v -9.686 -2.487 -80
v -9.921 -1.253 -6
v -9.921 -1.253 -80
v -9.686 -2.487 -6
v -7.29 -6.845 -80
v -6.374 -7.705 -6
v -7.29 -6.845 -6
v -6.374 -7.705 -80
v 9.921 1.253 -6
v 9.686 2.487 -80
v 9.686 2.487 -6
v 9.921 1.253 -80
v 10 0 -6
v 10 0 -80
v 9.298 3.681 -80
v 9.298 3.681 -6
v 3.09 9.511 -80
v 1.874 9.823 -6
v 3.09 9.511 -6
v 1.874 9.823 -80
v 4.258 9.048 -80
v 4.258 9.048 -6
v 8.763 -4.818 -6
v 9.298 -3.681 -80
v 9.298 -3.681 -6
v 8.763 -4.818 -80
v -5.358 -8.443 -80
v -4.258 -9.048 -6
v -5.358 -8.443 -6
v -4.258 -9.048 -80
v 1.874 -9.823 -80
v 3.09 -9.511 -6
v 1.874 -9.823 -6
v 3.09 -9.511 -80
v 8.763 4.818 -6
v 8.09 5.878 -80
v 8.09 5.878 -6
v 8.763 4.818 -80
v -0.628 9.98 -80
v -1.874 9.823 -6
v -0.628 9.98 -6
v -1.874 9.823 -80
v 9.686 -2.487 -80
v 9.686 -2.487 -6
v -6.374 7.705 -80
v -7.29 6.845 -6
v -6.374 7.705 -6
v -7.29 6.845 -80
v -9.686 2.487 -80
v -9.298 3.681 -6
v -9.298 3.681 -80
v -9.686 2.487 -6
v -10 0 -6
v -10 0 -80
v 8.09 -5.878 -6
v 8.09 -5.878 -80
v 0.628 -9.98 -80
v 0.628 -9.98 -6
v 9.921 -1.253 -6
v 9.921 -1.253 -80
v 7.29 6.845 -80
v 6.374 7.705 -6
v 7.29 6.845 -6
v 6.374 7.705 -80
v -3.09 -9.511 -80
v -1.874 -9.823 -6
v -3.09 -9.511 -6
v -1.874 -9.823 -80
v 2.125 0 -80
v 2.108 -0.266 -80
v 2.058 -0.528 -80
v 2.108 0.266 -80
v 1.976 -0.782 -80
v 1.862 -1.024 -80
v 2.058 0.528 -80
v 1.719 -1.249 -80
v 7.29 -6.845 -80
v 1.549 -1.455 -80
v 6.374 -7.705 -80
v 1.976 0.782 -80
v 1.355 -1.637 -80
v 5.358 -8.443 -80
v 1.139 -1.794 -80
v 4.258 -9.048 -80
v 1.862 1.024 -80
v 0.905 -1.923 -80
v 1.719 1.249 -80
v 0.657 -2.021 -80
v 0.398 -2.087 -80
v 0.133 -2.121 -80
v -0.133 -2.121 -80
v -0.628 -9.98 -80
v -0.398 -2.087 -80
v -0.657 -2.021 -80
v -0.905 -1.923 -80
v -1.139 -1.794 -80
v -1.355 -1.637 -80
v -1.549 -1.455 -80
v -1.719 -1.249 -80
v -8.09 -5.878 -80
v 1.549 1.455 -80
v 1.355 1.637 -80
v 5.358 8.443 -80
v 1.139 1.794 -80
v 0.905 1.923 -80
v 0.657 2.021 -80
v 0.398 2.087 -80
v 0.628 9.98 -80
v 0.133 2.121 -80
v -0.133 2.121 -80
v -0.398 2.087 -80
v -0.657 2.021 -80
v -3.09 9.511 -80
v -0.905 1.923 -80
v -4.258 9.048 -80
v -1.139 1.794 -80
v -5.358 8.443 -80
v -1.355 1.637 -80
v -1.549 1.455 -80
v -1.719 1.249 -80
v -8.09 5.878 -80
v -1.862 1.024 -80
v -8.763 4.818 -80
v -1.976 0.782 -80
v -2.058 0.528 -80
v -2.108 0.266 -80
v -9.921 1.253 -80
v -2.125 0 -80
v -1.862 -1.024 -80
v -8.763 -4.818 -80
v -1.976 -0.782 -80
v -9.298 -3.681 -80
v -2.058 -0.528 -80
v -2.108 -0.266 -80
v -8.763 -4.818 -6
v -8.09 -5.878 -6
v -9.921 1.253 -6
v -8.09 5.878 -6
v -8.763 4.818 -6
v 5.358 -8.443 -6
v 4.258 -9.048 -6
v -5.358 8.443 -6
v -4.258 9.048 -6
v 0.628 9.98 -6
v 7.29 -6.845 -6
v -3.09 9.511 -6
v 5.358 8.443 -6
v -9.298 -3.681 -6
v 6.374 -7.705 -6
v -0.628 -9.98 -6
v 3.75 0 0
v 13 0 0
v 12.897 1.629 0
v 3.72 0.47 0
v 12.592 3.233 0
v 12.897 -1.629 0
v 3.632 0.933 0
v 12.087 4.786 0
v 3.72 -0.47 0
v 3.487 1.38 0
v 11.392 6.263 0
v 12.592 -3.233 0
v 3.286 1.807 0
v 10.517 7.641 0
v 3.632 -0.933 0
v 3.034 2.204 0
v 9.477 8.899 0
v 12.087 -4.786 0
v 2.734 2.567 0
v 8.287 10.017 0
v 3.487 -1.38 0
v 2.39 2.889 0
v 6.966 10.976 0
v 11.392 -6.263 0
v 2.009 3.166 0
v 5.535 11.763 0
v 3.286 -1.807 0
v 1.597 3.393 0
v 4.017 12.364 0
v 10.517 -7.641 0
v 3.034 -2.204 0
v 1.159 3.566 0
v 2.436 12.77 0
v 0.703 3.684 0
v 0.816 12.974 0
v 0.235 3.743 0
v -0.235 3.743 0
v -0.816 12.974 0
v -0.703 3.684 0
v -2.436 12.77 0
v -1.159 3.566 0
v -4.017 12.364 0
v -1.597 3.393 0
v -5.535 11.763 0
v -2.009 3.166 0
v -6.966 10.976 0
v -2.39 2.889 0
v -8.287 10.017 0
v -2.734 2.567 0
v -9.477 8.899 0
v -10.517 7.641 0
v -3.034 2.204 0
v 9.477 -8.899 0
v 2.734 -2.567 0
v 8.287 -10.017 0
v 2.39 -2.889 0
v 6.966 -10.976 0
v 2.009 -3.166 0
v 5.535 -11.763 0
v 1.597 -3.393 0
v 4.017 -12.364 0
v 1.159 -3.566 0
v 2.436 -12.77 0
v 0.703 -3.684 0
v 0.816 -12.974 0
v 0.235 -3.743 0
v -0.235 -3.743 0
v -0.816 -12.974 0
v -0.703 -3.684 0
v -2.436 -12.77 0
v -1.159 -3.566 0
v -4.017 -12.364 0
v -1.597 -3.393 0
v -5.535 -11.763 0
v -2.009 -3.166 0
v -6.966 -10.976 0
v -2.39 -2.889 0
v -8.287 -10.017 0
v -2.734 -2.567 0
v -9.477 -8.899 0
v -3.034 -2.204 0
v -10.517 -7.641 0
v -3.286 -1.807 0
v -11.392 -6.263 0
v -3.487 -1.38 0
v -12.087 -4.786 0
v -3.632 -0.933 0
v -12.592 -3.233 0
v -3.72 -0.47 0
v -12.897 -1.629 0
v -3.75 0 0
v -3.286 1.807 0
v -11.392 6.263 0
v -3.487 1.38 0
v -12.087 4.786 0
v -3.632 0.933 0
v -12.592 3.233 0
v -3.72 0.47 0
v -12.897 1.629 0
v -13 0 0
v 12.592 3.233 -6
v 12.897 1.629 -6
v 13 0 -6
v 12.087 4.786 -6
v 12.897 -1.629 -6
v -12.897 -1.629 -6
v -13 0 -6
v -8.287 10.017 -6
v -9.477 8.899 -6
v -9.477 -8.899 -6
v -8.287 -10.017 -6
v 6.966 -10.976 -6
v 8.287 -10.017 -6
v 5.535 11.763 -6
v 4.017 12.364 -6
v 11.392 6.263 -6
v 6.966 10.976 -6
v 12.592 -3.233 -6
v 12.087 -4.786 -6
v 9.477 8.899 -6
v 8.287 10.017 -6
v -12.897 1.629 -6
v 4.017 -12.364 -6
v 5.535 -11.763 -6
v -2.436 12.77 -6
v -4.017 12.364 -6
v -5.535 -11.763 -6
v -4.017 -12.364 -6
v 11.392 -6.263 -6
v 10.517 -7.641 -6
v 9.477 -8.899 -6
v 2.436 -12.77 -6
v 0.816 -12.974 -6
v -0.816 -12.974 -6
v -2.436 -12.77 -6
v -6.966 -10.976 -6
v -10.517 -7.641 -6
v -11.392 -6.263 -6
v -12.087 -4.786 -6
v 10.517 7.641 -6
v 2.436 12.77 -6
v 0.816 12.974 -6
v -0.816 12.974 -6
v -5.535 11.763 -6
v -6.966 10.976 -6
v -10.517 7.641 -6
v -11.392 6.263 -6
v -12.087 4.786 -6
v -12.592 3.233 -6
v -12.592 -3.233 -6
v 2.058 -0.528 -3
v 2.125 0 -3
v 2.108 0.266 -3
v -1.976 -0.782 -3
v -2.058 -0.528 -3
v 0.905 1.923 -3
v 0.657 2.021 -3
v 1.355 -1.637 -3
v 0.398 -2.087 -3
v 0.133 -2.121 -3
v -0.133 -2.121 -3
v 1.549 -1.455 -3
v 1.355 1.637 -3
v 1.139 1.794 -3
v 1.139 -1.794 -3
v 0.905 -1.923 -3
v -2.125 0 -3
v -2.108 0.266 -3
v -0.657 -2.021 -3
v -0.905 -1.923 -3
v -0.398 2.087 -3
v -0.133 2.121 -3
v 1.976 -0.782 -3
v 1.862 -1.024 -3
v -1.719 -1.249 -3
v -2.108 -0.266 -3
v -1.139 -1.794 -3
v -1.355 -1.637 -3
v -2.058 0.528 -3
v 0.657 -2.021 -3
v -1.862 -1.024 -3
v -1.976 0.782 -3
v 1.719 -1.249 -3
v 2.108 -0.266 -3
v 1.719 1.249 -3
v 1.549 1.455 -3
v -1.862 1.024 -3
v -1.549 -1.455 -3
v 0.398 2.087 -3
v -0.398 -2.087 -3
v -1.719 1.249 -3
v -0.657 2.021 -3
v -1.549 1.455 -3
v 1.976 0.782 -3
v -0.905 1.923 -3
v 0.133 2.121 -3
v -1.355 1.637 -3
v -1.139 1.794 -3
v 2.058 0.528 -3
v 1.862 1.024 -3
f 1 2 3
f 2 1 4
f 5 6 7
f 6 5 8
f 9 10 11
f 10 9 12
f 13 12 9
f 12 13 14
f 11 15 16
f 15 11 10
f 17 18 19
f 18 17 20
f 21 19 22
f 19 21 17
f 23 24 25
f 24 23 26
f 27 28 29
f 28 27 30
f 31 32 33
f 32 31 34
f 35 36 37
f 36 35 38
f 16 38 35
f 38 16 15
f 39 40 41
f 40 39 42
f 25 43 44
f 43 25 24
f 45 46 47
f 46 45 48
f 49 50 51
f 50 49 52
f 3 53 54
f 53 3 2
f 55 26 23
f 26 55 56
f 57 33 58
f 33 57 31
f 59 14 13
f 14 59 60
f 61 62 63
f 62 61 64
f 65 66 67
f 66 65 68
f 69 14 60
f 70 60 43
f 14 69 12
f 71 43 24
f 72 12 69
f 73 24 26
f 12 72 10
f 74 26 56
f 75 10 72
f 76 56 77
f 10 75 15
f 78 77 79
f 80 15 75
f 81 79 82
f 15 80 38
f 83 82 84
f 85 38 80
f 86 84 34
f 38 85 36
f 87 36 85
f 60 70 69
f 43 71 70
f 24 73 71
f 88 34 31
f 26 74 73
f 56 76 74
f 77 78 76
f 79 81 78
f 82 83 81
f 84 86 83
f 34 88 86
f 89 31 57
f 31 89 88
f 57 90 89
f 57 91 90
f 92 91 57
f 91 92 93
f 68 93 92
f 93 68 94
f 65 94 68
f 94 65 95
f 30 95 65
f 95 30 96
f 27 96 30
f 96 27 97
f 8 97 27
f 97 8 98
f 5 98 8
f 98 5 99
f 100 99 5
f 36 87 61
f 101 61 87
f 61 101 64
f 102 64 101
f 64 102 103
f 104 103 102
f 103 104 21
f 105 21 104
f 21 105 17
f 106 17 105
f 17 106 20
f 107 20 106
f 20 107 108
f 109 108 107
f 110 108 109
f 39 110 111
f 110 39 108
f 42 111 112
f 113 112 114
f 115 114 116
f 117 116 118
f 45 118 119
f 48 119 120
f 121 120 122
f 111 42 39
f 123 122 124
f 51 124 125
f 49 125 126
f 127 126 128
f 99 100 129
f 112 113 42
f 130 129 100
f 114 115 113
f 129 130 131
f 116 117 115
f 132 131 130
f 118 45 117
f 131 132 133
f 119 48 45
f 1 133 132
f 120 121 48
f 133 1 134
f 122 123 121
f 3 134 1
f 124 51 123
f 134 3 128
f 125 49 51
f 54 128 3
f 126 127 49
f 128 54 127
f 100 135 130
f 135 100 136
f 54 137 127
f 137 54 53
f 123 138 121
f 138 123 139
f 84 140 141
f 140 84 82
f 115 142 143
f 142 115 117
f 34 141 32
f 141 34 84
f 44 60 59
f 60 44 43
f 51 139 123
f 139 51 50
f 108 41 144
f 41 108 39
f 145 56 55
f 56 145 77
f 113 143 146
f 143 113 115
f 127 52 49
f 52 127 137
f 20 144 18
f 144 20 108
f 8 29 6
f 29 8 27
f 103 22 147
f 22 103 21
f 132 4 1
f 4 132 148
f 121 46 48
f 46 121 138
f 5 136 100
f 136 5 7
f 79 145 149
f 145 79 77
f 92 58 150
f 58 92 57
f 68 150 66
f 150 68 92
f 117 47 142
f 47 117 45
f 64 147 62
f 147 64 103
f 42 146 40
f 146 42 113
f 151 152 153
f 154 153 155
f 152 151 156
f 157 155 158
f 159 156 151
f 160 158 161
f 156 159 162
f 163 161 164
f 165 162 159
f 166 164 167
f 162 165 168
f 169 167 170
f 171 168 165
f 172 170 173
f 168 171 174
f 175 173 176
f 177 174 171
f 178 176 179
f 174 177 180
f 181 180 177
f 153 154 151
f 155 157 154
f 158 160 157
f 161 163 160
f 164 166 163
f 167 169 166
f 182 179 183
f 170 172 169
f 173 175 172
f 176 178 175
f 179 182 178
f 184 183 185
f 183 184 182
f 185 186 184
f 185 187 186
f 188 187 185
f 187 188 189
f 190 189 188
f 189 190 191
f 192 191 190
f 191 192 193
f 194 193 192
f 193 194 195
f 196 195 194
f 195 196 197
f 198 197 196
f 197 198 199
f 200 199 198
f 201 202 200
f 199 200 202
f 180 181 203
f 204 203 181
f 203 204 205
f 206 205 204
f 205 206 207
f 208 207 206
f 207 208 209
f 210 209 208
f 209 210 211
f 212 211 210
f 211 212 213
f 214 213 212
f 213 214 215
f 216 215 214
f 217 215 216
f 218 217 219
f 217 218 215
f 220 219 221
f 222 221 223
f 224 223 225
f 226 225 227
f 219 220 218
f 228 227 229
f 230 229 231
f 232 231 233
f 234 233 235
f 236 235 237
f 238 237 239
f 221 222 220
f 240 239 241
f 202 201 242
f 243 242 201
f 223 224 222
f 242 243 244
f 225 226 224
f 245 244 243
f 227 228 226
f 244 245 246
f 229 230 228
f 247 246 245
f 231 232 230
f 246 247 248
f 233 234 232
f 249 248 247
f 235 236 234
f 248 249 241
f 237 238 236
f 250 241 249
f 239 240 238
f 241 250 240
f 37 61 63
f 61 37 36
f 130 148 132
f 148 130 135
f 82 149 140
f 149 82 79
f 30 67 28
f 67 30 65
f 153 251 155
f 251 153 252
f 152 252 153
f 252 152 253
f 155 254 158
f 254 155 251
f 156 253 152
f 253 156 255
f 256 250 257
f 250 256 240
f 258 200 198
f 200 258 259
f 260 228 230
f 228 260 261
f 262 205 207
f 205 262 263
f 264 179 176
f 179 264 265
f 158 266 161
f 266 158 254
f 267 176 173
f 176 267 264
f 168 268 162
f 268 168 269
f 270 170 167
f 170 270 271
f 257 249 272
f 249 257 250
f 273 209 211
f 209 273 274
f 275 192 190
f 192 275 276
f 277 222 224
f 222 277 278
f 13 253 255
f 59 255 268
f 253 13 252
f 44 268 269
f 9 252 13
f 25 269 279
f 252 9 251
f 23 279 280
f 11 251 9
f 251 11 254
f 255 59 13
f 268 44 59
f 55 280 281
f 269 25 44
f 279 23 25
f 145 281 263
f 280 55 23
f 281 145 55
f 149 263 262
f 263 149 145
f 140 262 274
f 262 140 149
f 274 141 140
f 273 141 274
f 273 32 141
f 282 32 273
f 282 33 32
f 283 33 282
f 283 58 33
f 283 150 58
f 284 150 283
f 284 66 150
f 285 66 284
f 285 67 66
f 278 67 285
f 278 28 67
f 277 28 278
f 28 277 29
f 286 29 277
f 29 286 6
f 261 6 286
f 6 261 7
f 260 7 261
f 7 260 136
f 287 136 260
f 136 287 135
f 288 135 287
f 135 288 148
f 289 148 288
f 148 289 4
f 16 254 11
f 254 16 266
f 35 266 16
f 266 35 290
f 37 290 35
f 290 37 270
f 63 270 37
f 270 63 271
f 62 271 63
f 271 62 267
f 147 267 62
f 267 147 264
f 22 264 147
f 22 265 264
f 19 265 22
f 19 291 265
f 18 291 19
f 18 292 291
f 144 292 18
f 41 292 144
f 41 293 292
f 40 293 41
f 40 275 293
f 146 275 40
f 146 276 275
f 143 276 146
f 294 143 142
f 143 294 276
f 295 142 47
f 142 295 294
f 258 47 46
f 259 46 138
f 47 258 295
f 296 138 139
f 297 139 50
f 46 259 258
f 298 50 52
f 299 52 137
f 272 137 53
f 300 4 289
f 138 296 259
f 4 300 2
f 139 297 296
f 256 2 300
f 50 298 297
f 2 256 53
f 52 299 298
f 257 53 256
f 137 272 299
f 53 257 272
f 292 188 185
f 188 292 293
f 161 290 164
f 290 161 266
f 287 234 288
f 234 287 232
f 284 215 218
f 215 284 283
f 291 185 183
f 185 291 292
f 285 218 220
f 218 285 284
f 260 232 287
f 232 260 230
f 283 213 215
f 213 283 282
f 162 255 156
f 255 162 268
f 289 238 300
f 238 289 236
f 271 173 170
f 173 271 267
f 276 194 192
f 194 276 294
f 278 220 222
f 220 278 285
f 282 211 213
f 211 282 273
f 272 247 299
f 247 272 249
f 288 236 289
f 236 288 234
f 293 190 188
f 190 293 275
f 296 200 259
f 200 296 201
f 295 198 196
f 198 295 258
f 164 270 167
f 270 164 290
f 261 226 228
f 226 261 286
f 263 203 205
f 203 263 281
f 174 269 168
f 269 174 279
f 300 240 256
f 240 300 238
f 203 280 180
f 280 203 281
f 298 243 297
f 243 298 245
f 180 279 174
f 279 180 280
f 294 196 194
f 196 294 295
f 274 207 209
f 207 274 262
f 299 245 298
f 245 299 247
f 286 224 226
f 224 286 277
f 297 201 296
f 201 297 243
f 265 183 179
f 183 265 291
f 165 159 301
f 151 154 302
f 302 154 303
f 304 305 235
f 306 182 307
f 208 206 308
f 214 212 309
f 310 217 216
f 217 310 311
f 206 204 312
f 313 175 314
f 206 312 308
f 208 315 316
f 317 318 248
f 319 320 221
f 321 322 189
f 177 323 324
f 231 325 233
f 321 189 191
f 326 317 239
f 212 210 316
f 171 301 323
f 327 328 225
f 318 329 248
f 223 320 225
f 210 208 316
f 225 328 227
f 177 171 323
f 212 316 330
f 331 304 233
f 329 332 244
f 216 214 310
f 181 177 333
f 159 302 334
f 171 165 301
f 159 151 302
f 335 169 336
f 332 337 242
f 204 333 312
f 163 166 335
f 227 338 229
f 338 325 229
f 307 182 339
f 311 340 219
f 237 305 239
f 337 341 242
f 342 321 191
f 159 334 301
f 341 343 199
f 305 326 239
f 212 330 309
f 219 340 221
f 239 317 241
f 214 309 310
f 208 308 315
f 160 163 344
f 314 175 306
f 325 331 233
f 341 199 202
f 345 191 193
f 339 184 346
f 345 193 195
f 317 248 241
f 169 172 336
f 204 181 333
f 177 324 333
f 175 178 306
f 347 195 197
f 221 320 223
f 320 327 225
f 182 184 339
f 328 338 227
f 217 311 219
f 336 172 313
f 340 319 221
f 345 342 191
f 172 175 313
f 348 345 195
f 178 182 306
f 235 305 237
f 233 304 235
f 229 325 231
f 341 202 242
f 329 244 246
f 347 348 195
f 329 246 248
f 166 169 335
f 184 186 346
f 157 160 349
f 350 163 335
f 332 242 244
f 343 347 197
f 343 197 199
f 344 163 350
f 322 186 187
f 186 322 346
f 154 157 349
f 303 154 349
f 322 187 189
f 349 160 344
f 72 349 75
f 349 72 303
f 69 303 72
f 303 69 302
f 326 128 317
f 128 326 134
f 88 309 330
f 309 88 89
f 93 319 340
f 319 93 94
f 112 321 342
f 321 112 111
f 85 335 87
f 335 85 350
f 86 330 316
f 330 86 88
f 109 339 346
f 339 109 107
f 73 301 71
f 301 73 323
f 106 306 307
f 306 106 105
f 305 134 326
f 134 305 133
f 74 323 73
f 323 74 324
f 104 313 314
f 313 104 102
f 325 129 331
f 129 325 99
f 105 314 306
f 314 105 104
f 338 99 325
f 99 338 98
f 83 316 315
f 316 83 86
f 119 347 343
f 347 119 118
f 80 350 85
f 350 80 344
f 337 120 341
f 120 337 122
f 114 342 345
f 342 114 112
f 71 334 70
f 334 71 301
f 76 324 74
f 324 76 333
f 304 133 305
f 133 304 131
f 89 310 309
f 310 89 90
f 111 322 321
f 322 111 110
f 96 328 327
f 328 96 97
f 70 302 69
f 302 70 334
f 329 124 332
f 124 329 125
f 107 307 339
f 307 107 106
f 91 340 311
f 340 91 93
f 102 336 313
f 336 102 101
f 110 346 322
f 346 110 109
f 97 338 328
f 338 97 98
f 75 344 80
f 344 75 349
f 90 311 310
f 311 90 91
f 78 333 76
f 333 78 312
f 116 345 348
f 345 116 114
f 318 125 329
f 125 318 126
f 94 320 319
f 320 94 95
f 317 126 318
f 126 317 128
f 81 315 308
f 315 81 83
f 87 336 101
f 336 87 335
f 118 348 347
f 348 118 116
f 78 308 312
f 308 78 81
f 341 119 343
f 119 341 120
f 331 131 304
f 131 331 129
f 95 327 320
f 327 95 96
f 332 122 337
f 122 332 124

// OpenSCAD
$fn = 50;


difference() {
	union() {
		translate(v = [0, 0, -80.0000000000]) {
			cylinder(h = 80, r = 10.0000000000);
		}
		translate(v = [0, 0, -6.0000000000]) {
			cylinder(h = 6, r = 13.0000000000);
		}
	}
	union() {
		translate(v = [0, 0, 0]) {
			rotate(a = [0, 0, 0]) {
				difference() {
					union() {
						#translate(v = [0, 0, -80.0000000000]) {
							cylinder(h = 80, r = 2.0000000000);
						}
						#translate(v = [0, 0, -3]) {
							cylinder(h = 3, r = 10.0000000000, r1 = 2.1250000000, r2 = 3.7500000000);
						}
						#translate(v = [0, 0, -80.0000000000]) {
							cylinder(h = 80, r = 2.1250000000);
						}
						#translate(v = [0, 0, -80.0000000000]) {
							cylinder(h = 80, r = 2.0000000000);
						}
					}
					union();
				}
			}
		}
	}
}
